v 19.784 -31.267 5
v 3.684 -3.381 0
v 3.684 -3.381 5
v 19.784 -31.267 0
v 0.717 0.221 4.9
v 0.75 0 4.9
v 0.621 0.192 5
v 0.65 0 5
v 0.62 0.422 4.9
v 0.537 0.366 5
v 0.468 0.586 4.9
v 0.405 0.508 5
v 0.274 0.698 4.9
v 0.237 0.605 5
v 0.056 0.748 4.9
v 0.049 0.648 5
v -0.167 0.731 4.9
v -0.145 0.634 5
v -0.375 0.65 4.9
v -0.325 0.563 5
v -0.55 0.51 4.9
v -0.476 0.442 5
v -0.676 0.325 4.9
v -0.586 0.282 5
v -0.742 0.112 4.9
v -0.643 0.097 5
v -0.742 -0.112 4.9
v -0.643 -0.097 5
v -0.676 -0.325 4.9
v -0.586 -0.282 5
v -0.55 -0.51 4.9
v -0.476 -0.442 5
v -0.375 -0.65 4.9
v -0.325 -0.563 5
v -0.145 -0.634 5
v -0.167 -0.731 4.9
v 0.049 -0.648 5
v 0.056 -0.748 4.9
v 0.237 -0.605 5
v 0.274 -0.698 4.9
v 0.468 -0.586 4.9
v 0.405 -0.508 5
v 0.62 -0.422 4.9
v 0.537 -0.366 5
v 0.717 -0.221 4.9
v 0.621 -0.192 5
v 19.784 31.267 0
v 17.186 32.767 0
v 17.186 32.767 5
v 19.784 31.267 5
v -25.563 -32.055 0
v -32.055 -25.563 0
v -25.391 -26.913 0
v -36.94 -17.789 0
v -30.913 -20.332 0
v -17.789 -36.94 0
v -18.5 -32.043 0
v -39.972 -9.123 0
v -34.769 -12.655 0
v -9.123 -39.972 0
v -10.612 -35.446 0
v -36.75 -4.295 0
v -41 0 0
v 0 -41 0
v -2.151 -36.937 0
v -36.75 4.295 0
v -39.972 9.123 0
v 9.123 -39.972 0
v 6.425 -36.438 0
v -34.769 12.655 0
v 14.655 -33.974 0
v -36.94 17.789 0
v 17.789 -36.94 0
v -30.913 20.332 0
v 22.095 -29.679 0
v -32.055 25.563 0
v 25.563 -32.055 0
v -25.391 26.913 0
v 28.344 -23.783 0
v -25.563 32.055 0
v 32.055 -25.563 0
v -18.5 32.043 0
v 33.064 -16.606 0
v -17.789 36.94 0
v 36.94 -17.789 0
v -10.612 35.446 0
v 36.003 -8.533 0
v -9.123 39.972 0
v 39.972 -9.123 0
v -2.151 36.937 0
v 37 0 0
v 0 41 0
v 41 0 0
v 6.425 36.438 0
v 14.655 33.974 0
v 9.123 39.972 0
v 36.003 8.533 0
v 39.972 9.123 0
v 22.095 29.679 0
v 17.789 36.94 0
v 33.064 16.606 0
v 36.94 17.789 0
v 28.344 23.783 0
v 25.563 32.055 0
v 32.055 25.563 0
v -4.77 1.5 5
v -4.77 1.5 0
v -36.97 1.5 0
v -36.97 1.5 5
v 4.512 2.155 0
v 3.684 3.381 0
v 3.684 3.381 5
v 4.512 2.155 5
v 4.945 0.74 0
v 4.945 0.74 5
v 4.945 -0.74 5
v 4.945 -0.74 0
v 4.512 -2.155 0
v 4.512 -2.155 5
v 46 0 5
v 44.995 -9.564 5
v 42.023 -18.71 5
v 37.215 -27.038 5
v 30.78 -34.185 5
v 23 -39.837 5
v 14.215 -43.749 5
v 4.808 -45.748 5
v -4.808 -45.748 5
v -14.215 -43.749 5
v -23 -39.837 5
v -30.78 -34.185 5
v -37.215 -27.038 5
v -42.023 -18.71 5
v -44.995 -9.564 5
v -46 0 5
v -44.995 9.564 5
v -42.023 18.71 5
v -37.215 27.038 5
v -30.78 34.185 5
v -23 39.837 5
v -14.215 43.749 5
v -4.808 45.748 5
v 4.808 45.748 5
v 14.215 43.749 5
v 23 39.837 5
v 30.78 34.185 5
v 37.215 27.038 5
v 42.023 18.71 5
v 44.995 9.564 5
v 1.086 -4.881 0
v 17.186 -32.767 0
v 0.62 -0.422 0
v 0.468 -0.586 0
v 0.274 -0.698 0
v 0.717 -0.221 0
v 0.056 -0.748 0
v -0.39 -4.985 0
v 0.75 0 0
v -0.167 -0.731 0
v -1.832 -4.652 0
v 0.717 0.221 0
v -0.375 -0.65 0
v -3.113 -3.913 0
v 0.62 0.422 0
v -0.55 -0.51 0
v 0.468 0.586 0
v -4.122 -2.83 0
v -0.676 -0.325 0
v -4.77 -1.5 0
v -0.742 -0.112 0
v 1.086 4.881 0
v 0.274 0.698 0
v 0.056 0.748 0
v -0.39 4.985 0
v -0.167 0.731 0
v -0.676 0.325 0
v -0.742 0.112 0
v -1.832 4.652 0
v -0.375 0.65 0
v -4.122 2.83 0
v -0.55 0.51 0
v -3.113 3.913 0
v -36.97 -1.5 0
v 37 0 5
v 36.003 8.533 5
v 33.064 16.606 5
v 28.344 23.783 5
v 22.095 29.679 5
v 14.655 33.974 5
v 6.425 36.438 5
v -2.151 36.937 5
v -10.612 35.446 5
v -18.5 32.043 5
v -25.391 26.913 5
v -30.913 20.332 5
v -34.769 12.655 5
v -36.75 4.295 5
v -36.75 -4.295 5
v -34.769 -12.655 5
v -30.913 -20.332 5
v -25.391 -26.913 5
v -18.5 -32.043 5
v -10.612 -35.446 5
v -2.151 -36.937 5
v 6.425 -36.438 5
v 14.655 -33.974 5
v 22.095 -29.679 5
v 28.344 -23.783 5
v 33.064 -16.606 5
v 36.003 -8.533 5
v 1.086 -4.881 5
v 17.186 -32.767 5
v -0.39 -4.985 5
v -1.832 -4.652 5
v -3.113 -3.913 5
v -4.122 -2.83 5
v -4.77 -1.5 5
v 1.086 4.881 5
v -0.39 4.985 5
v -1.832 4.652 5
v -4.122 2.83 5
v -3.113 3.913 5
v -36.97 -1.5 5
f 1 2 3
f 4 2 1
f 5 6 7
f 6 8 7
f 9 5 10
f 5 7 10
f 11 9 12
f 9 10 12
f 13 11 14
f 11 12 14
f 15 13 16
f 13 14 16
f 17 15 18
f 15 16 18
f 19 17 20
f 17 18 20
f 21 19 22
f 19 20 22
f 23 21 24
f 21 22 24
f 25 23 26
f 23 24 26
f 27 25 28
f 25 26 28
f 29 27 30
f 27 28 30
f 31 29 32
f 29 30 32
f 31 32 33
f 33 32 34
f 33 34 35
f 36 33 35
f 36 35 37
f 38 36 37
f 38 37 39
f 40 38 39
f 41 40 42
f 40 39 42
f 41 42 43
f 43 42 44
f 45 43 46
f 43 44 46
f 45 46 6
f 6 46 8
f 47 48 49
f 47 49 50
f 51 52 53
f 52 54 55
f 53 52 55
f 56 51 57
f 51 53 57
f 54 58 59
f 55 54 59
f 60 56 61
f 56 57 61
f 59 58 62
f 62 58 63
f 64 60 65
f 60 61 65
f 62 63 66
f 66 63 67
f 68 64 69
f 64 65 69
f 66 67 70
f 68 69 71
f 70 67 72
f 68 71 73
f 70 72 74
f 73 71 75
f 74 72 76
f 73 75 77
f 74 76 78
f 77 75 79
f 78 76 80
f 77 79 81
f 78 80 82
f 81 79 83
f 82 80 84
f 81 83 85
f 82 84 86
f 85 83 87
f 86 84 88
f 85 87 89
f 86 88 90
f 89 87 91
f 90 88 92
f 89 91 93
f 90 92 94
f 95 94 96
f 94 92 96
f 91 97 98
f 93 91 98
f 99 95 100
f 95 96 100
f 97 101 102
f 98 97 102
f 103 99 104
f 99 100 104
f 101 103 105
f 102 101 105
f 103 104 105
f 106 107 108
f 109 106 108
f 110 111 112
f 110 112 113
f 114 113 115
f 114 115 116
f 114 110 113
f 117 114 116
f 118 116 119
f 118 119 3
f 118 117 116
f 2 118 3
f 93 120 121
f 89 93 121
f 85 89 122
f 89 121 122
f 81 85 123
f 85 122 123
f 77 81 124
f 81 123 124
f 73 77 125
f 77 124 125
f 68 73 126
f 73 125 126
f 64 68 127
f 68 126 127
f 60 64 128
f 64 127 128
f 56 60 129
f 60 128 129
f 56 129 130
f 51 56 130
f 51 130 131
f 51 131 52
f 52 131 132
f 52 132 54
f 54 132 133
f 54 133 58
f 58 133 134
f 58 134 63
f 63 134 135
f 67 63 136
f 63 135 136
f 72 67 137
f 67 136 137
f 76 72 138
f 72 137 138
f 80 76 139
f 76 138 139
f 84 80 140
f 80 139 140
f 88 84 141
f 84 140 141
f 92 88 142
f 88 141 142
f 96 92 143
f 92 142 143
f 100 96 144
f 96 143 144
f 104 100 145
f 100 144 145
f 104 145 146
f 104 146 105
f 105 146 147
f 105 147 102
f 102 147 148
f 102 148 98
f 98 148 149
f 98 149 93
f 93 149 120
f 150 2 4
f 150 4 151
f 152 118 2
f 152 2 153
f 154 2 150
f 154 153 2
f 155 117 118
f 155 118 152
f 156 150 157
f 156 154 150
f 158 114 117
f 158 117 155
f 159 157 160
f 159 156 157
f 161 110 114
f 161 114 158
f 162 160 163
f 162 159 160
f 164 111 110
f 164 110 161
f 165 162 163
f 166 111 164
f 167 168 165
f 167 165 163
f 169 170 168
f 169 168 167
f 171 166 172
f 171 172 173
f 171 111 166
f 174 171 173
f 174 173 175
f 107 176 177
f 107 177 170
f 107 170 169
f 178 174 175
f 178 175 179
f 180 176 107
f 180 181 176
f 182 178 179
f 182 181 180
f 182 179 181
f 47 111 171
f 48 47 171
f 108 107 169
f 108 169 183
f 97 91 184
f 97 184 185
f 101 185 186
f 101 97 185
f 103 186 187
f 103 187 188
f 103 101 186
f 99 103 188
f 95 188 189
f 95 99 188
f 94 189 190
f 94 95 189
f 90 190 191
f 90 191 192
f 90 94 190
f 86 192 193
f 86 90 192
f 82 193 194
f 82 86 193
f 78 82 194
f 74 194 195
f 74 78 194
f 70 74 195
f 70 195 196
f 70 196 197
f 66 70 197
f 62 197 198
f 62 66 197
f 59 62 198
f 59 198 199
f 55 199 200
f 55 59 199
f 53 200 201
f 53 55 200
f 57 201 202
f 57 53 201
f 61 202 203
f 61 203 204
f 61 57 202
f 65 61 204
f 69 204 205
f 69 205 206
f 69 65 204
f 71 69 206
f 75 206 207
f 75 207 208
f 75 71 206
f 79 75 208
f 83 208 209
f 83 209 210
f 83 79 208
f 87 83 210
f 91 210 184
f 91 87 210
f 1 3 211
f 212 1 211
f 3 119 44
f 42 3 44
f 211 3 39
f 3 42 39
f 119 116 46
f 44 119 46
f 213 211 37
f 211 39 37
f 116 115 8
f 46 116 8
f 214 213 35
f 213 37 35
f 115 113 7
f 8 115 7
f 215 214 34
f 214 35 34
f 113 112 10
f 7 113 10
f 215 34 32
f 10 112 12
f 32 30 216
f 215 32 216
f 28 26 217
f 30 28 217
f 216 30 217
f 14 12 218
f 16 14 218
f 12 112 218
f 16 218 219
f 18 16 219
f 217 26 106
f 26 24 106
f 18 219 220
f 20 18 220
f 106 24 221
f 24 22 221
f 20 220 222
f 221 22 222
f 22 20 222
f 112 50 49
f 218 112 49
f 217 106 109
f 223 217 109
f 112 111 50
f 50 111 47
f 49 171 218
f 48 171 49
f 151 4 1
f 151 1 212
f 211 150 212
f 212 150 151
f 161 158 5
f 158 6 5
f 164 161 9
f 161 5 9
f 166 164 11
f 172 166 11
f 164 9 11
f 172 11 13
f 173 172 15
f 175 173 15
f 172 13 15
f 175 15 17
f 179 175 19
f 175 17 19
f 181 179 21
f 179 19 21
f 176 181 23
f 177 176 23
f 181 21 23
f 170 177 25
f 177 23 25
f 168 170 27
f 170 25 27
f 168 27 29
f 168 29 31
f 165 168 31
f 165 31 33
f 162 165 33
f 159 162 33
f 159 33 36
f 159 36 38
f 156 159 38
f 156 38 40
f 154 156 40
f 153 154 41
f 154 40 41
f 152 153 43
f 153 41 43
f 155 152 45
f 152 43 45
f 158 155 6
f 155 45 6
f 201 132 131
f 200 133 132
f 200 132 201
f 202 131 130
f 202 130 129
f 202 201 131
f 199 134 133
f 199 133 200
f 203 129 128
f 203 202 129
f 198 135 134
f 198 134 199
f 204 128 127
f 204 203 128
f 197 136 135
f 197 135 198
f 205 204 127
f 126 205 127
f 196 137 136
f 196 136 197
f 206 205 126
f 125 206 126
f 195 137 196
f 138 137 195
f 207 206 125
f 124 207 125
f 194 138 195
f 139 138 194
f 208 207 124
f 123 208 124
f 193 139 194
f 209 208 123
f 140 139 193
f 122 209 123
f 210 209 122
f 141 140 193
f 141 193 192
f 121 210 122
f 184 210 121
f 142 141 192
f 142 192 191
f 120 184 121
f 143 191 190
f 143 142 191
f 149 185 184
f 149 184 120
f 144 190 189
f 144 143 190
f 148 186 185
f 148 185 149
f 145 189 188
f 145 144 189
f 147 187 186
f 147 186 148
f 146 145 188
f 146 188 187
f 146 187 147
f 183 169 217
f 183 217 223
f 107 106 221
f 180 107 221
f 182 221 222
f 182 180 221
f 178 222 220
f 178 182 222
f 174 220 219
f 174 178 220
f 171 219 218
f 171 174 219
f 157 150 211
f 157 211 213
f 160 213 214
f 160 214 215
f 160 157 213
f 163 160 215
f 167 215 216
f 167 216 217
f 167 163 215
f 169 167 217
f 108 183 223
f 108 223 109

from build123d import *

# Parameters (mm, degrees)
SKETCH1_R           = 46
SKETCH1_R_2         = 37
BOSS_EXTRUDE1_DEPTH = 5
SKETCH7_W           = 36.969582091
SKETCH7_H           = 1.5
BOSS_EXTRUDE4_DEPTH = 5
CIRPATTERN4_COUNT   = 3
SKETCH8_R           = 5
BOSS_EXTRUDE5_DEPTH = 5


# Read off the part's stored shape, not the designer's step: Cavity1
with BuildPart() as part:
    # Sketch1 → Boss-Extrude1 (new body)
    with BuildSketch(Plane.XY):
        Circle(SKETCH1_R)
        Circle(SKETCH1_R_2, mode=Mode.SUBTRACT)
    extrude(amount=BOSS_EXTRUDE1_DEPTH)

    # Sketch6 → Cut-Revolve2 (revolve, cut)
    with BuildSketch(Plane(origin=(0, 0, 0), x_dir=(1, 0, 0), z_dir=(0, 1, 0)), mode=Mode.PRIVATE) as cut_revolve2_sk:
        Polygon((-46, 0), (-41, 0), (-46, -5), align=None)
    revolve(cut_revolve2_sk.sketch.rotate(Axis((0, 0, 0), (0, 0, -1)), 180), axis=Axis((0, 0, 0), (0, 0, -1)), mode=Mode.SUBTRACT)


with BuildPart() as body_2:
    # Sketch7 → Boss-Extrude4 (new body)
    with BuildSketch(Plane(origin=(0, 0, 0), x_dir=(-1, 0, 0), z_dir=(0, 0, -1))):
        with Locations((18.484791045, 0.75)):
            Rectangle(SKETCH7_W, SKETCH7_H)
        with Locations((18.484791045, -0.75)):
            Rectangle(SKETCH7_W, SKETCH7_H)
    extrude(amount=-BOSS_EXTRUDE4_DEPTH)


with BuildPart() as cirpattern4_1:
    # CirPattern4: pattern copy
    add(body_2.part.rotate(Axis((0, 0, 0), (0, 0, 1)), 1 * 360 / CIRPATTERN4_COUNT))


with BuildPart() as cirpattern4_2:
    # CirPattern4: pattern copy
    add(body_2.part.rotate(Axis((0, 0, 0), (0, 0, 1)), 2 * 360 / CIRPATTERN4_COUNT))


with BuildPart() as body_2_1:
    add(body_2.part)

    add(cirpattern4_1.part)  # Boss-Extrude5 merges CirPattern4_1

    add(cirpattern4_2.part)  # Boss-Extrude5 merges CirPattern4_2
    # Sketch8 → Boss-Extrude5 (add)
    with BuildSketch(Plane(origin=(0, 0, 0), x_dir=(-1, 0, 0), z_dir=(0, 0, -1))):
        Circle(SKETCH8_R)
    extrude(amount=-BOSS_EXTRUDE5_DEPTH)

    # Cavity1 outline → Cavity1 (revolve, cut)
    with BuildSketch(Plane.XZ):
        Polygon((0.75, 0), (0.75, 4.9), (0.65, 5), (0, 5), (0, 0), align=None)
    revolve(axis=Axis((0, 0, 0), (0, 0, 1)), mode=Mode.SUBTRACT)


solid = Compound([part.part, body_2_1.part])
